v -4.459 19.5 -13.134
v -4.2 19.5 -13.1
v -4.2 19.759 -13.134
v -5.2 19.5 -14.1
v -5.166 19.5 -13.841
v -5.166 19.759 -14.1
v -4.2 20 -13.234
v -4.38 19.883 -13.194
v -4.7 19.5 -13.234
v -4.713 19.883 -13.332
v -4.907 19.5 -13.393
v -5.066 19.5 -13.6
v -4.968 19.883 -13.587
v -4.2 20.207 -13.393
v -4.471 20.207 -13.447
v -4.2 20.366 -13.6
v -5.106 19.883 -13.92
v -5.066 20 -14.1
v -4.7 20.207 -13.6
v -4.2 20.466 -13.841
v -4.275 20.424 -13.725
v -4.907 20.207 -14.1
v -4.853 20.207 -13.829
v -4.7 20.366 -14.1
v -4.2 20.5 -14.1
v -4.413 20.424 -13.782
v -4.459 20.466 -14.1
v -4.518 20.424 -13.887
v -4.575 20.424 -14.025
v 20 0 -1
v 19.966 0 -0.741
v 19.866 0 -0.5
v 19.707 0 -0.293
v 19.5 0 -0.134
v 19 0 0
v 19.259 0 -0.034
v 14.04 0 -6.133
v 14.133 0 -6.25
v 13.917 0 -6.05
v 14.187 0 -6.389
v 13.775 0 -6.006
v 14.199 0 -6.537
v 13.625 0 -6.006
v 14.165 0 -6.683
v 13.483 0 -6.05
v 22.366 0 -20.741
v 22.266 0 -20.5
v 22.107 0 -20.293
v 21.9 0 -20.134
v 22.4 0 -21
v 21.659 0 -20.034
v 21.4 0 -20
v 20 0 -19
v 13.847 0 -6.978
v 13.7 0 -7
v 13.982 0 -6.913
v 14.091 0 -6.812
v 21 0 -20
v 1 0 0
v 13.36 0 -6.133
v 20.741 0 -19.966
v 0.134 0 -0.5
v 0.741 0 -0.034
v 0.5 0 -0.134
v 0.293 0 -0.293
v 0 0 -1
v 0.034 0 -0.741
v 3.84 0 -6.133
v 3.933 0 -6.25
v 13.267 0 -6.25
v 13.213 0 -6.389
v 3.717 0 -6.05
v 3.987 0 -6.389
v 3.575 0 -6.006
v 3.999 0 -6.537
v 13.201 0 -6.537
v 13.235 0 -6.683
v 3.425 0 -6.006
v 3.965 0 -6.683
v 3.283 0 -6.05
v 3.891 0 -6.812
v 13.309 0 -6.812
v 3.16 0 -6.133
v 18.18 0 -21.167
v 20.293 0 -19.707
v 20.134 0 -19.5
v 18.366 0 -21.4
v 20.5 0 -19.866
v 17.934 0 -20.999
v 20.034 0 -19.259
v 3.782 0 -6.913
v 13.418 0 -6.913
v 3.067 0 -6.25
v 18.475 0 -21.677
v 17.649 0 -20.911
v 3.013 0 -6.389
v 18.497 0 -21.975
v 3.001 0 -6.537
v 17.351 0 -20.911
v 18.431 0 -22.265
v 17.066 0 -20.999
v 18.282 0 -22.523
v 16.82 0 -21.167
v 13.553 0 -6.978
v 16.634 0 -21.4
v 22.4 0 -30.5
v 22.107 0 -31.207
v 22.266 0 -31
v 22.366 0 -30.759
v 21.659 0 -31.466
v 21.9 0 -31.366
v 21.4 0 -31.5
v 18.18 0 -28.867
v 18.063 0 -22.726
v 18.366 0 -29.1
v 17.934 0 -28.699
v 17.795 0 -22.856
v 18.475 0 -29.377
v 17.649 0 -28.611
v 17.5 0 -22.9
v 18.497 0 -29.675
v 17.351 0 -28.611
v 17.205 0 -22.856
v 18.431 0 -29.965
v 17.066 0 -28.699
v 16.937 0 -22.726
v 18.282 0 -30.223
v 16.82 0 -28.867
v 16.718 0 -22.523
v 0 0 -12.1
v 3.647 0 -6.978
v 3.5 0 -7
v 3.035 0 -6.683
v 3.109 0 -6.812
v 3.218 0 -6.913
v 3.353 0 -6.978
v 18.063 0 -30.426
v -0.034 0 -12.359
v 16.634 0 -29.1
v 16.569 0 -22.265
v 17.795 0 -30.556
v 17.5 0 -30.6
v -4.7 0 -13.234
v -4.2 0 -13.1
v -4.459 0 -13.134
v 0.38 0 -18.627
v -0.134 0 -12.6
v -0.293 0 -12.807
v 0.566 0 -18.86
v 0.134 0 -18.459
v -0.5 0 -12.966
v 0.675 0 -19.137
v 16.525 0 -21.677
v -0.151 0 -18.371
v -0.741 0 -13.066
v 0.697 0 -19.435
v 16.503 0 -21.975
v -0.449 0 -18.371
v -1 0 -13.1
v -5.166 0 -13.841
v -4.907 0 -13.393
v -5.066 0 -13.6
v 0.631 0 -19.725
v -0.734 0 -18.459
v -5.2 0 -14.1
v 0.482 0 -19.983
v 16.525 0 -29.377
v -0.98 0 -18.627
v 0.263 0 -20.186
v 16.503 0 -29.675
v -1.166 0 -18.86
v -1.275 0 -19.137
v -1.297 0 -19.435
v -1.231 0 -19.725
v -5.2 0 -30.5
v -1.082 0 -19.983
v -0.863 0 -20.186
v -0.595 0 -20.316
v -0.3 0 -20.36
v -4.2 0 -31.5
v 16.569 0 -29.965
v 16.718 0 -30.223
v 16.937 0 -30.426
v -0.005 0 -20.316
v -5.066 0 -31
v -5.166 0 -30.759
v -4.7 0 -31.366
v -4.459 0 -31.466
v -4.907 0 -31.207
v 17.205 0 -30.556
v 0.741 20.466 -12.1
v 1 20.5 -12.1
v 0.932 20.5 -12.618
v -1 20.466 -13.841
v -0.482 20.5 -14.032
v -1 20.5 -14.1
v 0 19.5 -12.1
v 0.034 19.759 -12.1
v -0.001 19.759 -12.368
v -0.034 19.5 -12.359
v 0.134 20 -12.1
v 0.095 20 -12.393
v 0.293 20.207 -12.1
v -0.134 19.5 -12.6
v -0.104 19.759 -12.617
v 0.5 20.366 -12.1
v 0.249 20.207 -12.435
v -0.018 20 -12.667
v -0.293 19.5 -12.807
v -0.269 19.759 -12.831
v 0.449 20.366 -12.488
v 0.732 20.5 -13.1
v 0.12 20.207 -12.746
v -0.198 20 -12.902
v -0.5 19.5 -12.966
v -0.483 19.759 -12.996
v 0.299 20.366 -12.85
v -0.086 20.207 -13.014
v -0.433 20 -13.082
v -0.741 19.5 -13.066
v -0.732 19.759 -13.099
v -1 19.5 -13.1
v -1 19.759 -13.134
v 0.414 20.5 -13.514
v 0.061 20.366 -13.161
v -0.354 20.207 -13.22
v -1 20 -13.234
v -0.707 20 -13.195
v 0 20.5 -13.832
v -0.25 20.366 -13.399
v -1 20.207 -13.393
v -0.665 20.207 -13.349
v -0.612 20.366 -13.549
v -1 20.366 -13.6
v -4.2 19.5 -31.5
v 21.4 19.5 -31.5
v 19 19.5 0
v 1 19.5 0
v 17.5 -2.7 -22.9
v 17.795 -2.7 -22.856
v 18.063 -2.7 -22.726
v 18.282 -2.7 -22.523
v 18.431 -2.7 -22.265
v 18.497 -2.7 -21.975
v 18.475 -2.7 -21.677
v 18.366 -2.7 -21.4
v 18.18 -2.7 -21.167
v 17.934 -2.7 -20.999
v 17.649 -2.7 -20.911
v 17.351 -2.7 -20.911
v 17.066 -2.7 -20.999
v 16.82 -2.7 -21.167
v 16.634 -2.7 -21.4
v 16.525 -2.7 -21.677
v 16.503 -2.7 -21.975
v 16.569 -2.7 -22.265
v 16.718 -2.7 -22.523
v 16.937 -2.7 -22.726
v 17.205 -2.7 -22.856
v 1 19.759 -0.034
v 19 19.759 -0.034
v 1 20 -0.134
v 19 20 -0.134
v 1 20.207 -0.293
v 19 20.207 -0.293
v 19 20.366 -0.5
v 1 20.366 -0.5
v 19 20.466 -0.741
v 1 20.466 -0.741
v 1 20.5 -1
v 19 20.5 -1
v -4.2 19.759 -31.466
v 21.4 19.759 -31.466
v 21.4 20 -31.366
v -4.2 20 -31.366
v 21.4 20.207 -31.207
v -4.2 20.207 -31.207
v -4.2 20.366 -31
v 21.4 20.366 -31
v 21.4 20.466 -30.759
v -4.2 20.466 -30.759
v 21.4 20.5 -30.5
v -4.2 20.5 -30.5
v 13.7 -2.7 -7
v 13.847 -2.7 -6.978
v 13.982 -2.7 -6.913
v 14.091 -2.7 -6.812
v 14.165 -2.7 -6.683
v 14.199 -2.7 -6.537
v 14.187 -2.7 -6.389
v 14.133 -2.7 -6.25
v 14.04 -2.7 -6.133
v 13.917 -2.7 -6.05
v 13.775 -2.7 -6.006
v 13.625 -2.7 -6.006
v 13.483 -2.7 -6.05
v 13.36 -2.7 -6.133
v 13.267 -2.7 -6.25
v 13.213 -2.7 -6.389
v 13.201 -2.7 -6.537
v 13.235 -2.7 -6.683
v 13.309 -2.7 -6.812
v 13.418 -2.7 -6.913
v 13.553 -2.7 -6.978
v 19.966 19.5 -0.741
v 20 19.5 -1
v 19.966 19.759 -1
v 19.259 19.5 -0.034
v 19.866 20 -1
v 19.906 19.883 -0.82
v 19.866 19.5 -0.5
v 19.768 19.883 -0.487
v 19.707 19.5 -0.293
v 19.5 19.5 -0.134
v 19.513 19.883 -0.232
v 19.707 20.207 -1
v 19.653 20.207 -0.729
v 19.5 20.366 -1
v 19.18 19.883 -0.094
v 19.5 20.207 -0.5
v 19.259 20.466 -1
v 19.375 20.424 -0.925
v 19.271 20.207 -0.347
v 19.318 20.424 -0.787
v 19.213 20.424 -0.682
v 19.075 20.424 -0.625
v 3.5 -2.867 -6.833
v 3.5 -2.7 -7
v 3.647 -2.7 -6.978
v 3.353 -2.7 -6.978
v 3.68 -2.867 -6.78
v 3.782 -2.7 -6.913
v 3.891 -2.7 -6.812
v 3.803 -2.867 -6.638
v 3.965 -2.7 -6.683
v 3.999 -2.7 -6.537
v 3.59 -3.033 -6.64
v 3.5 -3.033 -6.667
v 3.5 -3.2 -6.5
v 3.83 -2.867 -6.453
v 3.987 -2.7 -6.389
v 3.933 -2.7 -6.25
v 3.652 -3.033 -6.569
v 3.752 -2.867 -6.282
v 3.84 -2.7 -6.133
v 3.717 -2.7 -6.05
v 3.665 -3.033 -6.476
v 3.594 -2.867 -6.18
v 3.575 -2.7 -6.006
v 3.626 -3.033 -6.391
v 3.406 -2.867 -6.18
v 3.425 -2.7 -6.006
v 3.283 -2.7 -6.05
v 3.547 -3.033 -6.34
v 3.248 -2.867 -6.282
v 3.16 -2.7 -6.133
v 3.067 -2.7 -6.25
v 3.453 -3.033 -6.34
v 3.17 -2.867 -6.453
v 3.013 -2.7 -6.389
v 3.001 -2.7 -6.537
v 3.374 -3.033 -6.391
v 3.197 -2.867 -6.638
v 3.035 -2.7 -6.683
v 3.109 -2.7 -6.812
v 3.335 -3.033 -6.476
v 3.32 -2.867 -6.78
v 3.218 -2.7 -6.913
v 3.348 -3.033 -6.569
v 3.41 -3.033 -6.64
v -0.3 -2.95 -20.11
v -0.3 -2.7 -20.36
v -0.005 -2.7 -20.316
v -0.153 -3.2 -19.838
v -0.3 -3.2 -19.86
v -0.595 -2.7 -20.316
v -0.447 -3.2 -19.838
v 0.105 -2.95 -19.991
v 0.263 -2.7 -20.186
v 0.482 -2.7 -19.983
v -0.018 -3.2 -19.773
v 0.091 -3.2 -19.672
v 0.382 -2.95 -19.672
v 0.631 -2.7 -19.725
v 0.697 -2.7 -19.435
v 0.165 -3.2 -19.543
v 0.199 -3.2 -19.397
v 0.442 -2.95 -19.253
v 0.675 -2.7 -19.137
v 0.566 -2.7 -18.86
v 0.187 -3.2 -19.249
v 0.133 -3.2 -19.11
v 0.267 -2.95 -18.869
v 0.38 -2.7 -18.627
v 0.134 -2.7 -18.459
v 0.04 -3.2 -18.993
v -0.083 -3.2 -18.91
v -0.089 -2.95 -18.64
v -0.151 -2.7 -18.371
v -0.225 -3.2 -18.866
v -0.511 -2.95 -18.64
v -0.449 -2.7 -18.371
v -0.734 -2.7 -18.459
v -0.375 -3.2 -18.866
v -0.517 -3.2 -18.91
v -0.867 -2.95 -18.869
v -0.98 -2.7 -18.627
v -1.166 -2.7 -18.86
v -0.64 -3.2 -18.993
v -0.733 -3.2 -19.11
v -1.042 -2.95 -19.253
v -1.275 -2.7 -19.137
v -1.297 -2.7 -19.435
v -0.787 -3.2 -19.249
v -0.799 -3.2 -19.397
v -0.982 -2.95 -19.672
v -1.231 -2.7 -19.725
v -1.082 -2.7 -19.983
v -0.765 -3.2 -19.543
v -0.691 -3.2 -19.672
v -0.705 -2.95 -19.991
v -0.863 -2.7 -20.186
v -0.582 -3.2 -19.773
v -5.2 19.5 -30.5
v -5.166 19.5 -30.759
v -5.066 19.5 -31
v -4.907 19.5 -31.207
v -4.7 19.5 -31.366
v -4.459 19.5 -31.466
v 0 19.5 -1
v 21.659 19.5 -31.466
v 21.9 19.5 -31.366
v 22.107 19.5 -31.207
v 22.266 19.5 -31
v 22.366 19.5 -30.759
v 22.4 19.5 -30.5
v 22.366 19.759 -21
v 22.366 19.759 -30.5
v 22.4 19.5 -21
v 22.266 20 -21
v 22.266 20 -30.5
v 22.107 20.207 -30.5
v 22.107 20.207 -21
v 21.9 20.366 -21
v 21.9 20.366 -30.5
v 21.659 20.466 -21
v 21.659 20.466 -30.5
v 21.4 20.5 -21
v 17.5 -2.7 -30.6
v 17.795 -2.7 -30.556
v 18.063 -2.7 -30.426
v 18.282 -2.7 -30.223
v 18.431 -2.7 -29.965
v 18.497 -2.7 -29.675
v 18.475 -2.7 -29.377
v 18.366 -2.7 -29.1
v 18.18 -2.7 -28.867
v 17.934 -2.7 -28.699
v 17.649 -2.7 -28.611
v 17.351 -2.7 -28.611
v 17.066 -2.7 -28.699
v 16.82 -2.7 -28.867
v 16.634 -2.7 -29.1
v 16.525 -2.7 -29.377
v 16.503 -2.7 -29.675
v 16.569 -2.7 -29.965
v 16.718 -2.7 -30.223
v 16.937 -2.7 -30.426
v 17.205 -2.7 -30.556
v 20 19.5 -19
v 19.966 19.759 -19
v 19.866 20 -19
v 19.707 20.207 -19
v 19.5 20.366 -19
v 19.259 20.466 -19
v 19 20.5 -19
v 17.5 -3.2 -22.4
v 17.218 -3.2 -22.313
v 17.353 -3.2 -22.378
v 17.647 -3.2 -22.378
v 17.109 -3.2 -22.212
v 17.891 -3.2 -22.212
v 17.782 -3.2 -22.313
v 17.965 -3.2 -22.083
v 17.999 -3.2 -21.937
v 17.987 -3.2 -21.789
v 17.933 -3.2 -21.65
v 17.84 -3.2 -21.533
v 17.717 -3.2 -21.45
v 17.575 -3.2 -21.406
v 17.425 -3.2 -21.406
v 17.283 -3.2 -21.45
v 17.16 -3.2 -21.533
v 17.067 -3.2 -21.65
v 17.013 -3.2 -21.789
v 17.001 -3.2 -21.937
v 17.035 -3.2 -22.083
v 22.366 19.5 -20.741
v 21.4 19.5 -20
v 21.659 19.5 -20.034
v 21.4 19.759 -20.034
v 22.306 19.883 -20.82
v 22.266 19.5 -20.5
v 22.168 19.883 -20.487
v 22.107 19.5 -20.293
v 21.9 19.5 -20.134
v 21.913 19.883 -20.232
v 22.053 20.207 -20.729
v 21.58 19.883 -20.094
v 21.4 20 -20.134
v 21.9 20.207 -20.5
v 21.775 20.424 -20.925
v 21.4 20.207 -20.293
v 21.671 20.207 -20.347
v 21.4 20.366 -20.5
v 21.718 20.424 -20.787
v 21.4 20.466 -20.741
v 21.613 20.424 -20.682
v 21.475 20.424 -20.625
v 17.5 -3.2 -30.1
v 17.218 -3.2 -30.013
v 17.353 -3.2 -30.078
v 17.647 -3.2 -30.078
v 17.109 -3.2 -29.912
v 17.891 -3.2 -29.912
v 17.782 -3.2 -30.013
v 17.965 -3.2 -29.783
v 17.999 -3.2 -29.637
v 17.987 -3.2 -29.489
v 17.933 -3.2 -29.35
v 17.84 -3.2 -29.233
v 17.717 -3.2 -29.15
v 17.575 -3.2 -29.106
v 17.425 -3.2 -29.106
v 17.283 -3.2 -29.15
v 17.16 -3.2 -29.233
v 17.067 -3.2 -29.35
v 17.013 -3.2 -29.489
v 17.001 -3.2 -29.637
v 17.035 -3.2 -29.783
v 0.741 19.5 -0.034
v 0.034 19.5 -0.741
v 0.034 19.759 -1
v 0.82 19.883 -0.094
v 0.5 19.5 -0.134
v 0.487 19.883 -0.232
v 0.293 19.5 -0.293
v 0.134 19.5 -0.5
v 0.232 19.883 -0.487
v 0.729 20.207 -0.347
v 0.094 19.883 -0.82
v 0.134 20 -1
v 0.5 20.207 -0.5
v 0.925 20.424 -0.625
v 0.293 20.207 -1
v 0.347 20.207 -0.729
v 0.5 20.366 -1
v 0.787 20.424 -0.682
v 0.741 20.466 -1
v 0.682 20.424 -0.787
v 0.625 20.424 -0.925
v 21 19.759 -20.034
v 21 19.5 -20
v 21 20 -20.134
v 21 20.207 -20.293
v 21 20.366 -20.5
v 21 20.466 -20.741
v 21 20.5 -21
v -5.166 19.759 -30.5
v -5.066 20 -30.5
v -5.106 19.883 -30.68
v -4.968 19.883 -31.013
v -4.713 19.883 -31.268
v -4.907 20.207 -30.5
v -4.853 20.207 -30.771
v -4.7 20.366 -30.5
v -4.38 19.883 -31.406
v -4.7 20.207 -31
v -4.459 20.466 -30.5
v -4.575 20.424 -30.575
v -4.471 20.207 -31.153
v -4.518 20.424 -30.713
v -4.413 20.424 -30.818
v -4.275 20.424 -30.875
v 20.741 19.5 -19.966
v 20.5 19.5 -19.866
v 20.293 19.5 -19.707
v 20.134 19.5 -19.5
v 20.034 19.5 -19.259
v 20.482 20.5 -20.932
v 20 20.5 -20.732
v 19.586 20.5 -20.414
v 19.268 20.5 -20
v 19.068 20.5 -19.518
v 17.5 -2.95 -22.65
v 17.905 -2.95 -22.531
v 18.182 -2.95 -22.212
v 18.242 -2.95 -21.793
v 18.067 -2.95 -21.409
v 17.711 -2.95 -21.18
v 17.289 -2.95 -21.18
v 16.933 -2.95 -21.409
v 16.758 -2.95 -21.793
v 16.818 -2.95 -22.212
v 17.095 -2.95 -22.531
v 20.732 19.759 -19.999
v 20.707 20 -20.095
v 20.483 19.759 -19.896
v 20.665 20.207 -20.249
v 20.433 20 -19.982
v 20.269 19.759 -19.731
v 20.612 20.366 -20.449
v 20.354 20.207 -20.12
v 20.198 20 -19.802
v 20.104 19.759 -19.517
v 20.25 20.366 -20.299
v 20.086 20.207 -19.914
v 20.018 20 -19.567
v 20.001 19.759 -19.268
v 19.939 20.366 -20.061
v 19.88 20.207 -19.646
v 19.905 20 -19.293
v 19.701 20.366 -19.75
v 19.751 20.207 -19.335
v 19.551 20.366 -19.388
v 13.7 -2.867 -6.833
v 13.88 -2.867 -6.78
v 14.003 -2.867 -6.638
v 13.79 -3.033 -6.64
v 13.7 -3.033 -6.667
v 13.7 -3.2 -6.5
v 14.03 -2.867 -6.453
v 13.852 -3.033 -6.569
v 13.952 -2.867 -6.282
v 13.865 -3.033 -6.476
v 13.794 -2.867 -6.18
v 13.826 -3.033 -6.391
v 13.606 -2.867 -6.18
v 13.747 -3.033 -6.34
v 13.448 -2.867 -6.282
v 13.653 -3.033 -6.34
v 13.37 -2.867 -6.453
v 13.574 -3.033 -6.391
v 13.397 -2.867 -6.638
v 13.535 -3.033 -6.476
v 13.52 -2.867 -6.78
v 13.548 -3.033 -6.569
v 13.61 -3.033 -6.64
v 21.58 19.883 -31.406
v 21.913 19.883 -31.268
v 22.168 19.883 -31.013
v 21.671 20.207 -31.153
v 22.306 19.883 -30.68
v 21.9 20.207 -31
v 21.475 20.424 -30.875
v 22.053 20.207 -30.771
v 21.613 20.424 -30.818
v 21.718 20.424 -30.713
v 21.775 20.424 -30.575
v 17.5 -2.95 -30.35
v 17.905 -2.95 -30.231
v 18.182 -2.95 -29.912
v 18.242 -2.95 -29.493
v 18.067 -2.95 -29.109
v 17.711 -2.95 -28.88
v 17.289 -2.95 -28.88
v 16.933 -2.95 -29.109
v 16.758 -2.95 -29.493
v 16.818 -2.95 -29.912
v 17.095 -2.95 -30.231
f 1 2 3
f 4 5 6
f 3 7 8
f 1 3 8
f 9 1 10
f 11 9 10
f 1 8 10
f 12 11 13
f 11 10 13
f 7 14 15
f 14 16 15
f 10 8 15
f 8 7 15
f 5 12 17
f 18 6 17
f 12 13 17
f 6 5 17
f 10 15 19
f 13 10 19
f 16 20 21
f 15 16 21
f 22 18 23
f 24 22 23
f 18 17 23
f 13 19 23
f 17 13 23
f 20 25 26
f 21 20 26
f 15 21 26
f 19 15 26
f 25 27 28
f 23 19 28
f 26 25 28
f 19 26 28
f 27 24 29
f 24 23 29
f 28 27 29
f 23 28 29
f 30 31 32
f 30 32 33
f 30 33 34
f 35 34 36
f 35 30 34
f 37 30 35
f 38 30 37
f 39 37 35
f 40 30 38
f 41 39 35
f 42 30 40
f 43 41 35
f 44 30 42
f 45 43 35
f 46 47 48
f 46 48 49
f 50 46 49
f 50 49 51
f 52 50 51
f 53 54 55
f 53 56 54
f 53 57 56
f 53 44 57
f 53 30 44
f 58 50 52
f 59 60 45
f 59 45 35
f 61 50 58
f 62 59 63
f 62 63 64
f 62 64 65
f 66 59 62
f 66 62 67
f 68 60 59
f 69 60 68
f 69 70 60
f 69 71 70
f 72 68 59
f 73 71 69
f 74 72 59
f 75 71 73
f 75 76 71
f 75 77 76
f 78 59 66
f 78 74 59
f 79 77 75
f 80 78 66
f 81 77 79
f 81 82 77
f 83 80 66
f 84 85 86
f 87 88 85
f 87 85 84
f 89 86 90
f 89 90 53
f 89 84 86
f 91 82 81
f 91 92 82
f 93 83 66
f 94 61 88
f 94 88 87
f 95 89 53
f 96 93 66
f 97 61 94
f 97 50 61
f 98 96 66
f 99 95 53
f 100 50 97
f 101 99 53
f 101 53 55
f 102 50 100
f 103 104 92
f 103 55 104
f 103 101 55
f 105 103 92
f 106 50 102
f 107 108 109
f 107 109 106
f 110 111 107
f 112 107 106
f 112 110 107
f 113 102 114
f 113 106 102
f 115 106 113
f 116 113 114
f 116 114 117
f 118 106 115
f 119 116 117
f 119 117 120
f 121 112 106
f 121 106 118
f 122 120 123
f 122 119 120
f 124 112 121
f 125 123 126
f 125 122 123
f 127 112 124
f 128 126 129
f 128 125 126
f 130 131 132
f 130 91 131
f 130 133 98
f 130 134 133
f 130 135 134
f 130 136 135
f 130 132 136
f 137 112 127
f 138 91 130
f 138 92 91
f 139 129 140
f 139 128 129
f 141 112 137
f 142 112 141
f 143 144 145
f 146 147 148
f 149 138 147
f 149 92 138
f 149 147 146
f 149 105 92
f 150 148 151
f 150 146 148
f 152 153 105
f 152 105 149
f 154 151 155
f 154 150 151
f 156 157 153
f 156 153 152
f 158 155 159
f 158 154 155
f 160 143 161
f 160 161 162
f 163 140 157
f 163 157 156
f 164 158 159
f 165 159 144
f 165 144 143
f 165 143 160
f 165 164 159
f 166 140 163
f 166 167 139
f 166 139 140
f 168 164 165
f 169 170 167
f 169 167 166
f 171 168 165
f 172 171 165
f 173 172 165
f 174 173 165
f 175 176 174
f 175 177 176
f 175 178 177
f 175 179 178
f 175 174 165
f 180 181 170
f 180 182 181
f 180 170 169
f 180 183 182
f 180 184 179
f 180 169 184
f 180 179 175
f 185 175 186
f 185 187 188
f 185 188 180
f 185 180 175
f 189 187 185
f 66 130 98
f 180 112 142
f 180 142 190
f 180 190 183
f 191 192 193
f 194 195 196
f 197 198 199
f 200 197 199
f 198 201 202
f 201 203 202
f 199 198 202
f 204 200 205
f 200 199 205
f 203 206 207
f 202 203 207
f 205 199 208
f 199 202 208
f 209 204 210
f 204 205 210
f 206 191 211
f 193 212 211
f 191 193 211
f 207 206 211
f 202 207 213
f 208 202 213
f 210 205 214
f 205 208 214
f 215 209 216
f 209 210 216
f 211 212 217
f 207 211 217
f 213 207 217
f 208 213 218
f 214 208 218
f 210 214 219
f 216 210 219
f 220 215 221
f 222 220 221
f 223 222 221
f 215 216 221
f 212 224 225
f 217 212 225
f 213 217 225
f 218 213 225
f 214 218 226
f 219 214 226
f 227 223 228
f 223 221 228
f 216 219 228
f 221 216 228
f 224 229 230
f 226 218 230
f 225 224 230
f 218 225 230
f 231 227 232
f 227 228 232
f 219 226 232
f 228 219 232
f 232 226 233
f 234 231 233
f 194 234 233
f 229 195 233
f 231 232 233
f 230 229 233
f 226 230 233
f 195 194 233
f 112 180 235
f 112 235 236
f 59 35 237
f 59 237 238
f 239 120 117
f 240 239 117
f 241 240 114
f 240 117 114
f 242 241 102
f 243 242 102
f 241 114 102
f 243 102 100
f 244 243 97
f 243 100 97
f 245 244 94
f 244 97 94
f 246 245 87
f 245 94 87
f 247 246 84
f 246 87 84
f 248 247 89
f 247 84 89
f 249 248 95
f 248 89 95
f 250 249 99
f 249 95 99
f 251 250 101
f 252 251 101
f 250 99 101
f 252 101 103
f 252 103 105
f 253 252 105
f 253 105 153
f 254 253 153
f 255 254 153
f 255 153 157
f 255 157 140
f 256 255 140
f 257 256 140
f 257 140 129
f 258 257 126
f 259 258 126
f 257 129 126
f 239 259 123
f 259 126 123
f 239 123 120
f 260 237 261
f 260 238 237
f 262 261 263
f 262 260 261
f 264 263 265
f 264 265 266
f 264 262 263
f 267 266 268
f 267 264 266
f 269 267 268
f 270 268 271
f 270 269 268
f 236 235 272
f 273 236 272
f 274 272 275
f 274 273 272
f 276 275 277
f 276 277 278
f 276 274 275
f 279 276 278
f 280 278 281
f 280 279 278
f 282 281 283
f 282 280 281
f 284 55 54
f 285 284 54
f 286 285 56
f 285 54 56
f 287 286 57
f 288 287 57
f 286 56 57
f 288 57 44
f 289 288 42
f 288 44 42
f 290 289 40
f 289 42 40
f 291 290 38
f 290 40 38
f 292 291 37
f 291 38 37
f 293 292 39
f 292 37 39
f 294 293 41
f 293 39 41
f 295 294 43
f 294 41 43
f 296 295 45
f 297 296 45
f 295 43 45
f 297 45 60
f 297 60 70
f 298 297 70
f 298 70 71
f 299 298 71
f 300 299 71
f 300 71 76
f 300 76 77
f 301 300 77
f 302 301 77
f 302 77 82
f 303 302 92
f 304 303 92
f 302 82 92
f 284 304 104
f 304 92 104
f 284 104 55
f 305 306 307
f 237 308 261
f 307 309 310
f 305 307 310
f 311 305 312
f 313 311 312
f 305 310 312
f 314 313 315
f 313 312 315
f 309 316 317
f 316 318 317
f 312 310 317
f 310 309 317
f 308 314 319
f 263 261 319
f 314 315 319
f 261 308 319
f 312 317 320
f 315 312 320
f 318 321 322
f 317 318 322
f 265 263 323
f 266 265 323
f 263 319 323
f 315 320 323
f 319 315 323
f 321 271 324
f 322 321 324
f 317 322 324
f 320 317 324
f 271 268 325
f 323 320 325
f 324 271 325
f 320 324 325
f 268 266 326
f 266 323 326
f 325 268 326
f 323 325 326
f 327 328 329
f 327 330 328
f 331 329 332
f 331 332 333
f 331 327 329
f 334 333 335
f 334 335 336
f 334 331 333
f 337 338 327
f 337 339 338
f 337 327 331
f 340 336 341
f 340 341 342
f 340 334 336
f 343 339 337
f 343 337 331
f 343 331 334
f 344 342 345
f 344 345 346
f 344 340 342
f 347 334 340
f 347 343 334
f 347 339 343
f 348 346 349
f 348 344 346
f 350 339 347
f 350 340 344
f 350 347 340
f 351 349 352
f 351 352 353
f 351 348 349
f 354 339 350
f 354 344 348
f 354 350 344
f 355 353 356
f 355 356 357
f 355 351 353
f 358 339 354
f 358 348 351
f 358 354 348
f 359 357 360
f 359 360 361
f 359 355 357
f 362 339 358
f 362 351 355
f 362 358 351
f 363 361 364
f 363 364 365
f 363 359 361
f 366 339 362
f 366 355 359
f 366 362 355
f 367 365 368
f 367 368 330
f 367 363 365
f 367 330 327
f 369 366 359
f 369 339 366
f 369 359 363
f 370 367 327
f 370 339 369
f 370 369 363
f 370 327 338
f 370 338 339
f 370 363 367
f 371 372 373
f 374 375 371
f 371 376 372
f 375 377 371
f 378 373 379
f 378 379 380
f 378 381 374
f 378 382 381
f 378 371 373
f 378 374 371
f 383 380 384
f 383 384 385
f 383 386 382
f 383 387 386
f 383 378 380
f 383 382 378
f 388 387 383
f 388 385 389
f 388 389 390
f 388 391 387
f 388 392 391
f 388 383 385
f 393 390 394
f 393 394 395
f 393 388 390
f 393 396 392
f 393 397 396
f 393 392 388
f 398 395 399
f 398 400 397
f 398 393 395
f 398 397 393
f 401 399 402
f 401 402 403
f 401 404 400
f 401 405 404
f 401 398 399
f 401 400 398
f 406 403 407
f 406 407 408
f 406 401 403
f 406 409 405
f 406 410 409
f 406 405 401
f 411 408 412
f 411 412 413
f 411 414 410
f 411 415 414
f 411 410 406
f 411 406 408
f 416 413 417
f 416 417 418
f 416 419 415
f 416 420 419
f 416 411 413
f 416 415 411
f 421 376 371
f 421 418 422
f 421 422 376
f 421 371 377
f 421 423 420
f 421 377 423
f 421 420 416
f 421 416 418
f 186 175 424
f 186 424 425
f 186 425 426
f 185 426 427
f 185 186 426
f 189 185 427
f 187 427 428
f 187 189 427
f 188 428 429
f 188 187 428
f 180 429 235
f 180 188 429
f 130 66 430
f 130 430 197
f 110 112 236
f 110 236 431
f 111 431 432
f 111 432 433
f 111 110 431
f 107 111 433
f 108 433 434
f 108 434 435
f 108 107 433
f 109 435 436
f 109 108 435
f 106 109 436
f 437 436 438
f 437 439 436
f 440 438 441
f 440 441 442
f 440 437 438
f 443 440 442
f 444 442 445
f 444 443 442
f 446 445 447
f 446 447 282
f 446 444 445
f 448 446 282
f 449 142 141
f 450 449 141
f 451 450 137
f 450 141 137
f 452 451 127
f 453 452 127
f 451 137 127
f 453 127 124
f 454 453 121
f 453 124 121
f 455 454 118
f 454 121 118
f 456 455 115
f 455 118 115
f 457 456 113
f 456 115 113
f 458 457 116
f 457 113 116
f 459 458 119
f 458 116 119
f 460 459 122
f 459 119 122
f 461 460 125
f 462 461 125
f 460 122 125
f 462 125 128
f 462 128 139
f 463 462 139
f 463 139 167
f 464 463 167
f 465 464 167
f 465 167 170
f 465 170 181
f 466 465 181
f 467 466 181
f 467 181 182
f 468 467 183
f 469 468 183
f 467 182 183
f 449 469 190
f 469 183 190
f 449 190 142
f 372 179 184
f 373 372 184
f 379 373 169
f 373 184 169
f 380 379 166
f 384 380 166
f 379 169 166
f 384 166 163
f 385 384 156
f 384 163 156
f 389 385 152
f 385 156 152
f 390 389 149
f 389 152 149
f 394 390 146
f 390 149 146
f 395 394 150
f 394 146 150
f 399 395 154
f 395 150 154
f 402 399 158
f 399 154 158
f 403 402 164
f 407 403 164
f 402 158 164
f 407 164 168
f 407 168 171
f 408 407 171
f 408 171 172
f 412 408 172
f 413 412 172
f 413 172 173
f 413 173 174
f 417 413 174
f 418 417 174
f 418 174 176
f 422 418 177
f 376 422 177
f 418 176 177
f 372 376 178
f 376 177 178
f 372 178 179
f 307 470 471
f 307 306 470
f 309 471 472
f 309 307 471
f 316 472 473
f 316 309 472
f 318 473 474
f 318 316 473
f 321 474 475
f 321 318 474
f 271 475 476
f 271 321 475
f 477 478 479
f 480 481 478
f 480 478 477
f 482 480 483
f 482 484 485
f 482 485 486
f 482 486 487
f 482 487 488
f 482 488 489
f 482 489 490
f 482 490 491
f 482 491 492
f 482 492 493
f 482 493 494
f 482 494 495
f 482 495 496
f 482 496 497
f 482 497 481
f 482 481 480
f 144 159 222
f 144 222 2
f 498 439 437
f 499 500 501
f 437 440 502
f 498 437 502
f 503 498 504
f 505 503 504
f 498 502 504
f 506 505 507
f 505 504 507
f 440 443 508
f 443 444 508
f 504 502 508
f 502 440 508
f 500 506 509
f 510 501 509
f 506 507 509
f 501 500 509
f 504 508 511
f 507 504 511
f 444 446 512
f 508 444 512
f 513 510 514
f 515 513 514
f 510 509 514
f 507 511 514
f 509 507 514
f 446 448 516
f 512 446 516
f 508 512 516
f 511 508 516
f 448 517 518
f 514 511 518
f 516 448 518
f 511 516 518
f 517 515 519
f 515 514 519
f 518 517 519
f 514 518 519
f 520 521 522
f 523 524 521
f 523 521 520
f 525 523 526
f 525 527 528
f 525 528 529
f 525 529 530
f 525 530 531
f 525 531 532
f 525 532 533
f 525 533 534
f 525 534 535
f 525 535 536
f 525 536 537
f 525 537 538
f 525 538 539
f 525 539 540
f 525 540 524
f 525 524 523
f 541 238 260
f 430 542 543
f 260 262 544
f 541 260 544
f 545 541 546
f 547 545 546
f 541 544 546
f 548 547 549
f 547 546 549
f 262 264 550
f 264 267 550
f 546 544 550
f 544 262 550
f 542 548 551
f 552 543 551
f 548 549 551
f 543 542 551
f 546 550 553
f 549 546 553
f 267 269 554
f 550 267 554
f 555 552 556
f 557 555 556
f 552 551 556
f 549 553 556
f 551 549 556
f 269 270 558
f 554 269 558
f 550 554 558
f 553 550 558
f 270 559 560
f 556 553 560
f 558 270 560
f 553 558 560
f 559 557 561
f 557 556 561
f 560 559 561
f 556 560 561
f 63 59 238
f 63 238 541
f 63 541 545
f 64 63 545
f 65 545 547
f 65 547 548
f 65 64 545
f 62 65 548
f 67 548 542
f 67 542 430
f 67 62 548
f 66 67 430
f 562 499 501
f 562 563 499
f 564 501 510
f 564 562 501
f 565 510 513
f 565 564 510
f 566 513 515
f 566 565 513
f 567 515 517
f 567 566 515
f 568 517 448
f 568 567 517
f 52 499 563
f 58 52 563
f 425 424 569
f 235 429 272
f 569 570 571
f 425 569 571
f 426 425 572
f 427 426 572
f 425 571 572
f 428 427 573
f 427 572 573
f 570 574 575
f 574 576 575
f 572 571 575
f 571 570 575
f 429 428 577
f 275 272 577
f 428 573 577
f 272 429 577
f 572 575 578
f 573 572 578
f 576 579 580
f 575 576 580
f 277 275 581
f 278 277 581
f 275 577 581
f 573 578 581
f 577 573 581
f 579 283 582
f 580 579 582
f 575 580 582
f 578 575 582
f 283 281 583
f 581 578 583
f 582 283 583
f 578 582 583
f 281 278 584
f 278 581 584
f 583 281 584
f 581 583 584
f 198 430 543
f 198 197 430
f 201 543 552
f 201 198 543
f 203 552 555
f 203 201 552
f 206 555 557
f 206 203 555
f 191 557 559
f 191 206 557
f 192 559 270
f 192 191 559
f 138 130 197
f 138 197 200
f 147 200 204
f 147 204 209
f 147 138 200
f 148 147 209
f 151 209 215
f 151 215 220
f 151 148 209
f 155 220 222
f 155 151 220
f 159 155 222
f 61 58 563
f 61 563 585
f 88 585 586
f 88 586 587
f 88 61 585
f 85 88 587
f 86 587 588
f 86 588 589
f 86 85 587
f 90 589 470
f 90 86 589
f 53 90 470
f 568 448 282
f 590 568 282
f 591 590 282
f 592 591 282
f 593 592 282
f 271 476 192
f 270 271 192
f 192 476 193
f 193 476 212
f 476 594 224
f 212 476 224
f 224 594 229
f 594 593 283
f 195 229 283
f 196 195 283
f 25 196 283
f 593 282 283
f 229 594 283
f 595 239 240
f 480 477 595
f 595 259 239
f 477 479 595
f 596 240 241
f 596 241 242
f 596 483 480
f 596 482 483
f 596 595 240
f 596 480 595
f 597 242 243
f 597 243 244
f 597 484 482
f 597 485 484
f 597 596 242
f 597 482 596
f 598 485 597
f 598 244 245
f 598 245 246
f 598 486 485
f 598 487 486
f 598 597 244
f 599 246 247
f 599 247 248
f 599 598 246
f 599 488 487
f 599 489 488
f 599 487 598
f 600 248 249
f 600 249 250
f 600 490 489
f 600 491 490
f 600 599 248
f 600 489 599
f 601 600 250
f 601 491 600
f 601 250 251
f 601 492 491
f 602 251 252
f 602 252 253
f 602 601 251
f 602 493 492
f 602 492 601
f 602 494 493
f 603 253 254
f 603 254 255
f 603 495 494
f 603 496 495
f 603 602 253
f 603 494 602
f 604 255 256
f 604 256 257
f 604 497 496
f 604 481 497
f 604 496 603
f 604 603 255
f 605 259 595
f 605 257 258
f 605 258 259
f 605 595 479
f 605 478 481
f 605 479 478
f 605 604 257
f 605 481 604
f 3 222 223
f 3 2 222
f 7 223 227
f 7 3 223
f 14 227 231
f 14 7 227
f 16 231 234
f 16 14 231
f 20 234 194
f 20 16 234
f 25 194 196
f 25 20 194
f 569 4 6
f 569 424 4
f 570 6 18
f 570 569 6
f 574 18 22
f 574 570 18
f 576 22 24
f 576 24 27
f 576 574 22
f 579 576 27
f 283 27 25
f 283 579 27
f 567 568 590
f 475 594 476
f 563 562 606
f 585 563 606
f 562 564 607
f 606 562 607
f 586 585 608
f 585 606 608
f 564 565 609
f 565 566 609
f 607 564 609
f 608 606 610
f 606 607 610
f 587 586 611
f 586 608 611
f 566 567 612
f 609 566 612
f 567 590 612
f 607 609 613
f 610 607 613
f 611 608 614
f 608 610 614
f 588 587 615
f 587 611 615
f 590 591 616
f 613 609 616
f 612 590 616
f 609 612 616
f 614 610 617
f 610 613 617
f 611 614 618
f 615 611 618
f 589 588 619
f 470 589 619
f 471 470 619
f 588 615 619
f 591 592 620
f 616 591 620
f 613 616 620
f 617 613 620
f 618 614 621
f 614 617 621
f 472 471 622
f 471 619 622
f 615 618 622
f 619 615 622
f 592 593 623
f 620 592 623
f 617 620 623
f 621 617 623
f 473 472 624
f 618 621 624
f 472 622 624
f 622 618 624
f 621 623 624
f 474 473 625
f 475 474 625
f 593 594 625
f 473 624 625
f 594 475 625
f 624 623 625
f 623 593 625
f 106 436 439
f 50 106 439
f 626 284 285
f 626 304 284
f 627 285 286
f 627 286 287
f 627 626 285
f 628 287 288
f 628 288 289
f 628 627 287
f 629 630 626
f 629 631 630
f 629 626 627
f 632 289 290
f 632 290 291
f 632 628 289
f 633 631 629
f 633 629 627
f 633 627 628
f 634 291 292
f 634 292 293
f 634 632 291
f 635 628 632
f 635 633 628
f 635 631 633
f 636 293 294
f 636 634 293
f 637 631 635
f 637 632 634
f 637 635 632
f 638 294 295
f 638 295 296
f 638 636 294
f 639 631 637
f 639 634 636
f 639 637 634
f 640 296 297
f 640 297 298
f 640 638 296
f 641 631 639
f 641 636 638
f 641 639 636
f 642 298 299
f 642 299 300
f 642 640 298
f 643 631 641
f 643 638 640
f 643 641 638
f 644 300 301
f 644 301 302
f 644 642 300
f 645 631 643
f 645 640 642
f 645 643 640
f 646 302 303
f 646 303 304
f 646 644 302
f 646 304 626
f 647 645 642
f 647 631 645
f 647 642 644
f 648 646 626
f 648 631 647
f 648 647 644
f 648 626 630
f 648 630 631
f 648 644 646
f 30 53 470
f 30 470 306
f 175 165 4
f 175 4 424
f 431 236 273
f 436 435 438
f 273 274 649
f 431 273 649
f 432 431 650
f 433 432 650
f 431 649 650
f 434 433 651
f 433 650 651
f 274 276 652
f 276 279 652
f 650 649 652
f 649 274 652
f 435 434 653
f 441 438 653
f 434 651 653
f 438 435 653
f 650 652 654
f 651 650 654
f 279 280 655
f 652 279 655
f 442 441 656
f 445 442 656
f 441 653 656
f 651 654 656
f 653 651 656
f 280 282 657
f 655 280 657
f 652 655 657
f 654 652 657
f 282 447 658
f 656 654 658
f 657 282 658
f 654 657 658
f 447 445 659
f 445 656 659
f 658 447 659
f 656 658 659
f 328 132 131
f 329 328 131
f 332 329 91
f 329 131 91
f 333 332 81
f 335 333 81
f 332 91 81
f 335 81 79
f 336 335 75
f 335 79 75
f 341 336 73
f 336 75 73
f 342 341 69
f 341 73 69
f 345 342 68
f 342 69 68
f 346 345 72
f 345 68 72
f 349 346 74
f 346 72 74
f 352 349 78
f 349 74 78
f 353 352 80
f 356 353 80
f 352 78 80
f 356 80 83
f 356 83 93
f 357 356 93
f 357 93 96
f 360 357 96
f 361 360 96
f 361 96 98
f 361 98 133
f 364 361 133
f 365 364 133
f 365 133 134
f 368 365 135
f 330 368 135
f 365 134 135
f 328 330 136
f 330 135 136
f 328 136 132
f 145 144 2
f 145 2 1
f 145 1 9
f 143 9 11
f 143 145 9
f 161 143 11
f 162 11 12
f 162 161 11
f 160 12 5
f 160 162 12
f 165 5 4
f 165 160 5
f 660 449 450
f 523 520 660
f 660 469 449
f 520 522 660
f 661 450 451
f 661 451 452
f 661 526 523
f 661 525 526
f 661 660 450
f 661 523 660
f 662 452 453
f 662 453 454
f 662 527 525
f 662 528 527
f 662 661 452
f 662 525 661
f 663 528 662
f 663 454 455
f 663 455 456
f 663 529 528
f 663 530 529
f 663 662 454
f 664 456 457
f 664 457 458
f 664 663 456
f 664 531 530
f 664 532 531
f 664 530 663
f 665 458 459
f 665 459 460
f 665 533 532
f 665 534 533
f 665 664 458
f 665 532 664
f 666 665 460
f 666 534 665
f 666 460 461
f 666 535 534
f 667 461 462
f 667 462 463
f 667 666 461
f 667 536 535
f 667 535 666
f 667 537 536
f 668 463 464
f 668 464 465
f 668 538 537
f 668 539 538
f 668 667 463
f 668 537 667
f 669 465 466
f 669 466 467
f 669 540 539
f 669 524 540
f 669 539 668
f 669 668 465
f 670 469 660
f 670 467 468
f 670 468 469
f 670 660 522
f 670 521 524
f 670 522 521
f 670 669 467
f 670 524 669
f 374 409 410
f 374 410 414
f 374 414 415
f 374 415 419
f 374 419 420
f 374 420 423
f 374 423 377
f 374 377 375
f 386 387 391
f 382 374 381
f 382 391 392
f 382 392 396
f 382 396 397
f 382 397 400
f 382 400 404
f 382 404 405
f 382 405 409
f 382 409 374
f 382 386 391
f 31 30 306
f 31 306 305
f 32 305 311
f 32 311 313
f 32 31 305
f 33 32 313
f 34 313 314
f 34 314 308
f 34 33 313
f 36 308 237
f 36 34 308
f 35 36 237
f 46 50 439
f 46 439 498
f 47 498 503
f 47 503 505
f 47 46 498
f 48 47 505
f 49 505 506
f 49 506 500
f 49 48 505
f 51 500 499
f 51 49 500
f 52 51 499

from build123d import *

# Parameters (mm, degrees)
BOSS_EXTRUDE1_DEPTH = 20.5
FILLET1_R           = 1
SKETCH2_R           = 0.5
SKETCH2_R_2         = 1
BOSS_EXTRUDE2_DEPTH = 3.2
CHAMFER1_SIZE       = 0.5


with BuildPart() as part:
    # Sketch1 → Boss-Extrude1 (new body)
    with BuildSketch(Plane(origin=(0, 0, 0), x_dir=(1, 0, 0), z_dir=(0, 1, 0))):
        with BuildLine():
            Line((0, 1), (0, 12.1))
            ThreePointArc((0, 12.1), (-0.292893219, 12.807106781), (-1, 13.1))
            Line((-1, 13.1), (-4.2, 13.1))
            ThreePointArc((-4.2, 13.1), (-4.907106781, 13.392893219), (-5.2, 14.1))
            Line((-5.2, 14.1), (-5.2, 30.5))
            ThreePointArc((-5.2, 30.5), (-4.907106781, 31.207106781), (-4.2, 31.5))
            Line((-4.2, 31.5), (21.4, 31.5))
            ThreePointArc((21.4, 31.5), (22.107106781, 31.207106781), (22.4, 30.5))
            Line((22.4, 30.5), (22.4, 21))
            ThreePointArc((22.4, 21), (22.107106781, 20.292893219), (21.4, 20))
            Line((21.4, 20), (21, 20))
            ThreePointArc((21, 20), (20.292893219, 19.707106781), (20, 19))
            Line((20, 19), (20, 1))
            ThreePointArc((20, 1), (19.707106781, 0.292893219), (19, 0))
            Line((19, 0), (1, 0))
            ThreePointArc((1, 0), (0.292893219, 0.292893219), (0, 1))
        make_face()
    extrude(amount=BOSS_EXTRUDE1_DEPTH)

    # Fillet1
    fillet1_edges = [part.edges().sort_by_distance(p)[0] for p in [
        (-4.907106781, 20.5, -31.207106781),
        (-5.2, 20.5, -22.3),
        (-4.907106781, 20.5, -13.392893219),
        (-2.6, 20.5, -13.1),
        (-0.292893219, 20.5, -12.807106781),
        (0, 20.5, -6.55),
        (0.292893219, 20.5, -0.292893219),
        (10, 20.5, 0),
        (19.707106781, 20.5, -0.292893219),
        (20, 20.5, -10),
        (22.107106781, 20.5, -31.207106781),
        (20.292893219, 20.5, -19.707106781),
        (21.2, 20.5, -20),
        (22.107106781, 20.5, -20.292893219),
        (22.4, 20.5, -25.75),
        (8.6, 20.5, -31.5),
    ]]
    fillet(fillet1_edges, radius=FILLET1_R)

    # Sketch2 → Boss-Extrude2 (add)
    with BuildSketch(Plane.XZ):
        with Locations(Location((13.7, -6.5, 0), (0, 0, 270))):
            Circle(SKETCH2_R)
        with Locations(Location((3.5, -6.5, 0), (0, 0, 270))):
            Circle(SKETCH2_R)
        with Locations(Location((17.5, -21.9, 0), (0, 0, 270))):
            Circle(SKETCH2_R_2)
        with Locations(Location((17.5, -29.6, 0), (0, 0, 270))):
            Circle(SKETCH2_R_2)
        with Locations(Location((-0.3, -19.36, 0), (0, 0, 270))):
            Circle(SKETCH2_R_2)
    extrude(amount=BOSS_EXTRUDE2_DEPTH)

    # Chamfer1
    chamfer1_edges = [part.edges().sort_by_distance(p)[0] for p in [
        (-0.3, -3.2, -18.36),
        (13.7, -3.2, -6),
        (3.5, -3.2, -6),
        (17.5, -3.2, -20.9),
        (17.5, -3.2, -28.6),
    ]]
    chamfer(chamfer1_edges, length=CHAMFER1_SIZE)


solid = part.part
